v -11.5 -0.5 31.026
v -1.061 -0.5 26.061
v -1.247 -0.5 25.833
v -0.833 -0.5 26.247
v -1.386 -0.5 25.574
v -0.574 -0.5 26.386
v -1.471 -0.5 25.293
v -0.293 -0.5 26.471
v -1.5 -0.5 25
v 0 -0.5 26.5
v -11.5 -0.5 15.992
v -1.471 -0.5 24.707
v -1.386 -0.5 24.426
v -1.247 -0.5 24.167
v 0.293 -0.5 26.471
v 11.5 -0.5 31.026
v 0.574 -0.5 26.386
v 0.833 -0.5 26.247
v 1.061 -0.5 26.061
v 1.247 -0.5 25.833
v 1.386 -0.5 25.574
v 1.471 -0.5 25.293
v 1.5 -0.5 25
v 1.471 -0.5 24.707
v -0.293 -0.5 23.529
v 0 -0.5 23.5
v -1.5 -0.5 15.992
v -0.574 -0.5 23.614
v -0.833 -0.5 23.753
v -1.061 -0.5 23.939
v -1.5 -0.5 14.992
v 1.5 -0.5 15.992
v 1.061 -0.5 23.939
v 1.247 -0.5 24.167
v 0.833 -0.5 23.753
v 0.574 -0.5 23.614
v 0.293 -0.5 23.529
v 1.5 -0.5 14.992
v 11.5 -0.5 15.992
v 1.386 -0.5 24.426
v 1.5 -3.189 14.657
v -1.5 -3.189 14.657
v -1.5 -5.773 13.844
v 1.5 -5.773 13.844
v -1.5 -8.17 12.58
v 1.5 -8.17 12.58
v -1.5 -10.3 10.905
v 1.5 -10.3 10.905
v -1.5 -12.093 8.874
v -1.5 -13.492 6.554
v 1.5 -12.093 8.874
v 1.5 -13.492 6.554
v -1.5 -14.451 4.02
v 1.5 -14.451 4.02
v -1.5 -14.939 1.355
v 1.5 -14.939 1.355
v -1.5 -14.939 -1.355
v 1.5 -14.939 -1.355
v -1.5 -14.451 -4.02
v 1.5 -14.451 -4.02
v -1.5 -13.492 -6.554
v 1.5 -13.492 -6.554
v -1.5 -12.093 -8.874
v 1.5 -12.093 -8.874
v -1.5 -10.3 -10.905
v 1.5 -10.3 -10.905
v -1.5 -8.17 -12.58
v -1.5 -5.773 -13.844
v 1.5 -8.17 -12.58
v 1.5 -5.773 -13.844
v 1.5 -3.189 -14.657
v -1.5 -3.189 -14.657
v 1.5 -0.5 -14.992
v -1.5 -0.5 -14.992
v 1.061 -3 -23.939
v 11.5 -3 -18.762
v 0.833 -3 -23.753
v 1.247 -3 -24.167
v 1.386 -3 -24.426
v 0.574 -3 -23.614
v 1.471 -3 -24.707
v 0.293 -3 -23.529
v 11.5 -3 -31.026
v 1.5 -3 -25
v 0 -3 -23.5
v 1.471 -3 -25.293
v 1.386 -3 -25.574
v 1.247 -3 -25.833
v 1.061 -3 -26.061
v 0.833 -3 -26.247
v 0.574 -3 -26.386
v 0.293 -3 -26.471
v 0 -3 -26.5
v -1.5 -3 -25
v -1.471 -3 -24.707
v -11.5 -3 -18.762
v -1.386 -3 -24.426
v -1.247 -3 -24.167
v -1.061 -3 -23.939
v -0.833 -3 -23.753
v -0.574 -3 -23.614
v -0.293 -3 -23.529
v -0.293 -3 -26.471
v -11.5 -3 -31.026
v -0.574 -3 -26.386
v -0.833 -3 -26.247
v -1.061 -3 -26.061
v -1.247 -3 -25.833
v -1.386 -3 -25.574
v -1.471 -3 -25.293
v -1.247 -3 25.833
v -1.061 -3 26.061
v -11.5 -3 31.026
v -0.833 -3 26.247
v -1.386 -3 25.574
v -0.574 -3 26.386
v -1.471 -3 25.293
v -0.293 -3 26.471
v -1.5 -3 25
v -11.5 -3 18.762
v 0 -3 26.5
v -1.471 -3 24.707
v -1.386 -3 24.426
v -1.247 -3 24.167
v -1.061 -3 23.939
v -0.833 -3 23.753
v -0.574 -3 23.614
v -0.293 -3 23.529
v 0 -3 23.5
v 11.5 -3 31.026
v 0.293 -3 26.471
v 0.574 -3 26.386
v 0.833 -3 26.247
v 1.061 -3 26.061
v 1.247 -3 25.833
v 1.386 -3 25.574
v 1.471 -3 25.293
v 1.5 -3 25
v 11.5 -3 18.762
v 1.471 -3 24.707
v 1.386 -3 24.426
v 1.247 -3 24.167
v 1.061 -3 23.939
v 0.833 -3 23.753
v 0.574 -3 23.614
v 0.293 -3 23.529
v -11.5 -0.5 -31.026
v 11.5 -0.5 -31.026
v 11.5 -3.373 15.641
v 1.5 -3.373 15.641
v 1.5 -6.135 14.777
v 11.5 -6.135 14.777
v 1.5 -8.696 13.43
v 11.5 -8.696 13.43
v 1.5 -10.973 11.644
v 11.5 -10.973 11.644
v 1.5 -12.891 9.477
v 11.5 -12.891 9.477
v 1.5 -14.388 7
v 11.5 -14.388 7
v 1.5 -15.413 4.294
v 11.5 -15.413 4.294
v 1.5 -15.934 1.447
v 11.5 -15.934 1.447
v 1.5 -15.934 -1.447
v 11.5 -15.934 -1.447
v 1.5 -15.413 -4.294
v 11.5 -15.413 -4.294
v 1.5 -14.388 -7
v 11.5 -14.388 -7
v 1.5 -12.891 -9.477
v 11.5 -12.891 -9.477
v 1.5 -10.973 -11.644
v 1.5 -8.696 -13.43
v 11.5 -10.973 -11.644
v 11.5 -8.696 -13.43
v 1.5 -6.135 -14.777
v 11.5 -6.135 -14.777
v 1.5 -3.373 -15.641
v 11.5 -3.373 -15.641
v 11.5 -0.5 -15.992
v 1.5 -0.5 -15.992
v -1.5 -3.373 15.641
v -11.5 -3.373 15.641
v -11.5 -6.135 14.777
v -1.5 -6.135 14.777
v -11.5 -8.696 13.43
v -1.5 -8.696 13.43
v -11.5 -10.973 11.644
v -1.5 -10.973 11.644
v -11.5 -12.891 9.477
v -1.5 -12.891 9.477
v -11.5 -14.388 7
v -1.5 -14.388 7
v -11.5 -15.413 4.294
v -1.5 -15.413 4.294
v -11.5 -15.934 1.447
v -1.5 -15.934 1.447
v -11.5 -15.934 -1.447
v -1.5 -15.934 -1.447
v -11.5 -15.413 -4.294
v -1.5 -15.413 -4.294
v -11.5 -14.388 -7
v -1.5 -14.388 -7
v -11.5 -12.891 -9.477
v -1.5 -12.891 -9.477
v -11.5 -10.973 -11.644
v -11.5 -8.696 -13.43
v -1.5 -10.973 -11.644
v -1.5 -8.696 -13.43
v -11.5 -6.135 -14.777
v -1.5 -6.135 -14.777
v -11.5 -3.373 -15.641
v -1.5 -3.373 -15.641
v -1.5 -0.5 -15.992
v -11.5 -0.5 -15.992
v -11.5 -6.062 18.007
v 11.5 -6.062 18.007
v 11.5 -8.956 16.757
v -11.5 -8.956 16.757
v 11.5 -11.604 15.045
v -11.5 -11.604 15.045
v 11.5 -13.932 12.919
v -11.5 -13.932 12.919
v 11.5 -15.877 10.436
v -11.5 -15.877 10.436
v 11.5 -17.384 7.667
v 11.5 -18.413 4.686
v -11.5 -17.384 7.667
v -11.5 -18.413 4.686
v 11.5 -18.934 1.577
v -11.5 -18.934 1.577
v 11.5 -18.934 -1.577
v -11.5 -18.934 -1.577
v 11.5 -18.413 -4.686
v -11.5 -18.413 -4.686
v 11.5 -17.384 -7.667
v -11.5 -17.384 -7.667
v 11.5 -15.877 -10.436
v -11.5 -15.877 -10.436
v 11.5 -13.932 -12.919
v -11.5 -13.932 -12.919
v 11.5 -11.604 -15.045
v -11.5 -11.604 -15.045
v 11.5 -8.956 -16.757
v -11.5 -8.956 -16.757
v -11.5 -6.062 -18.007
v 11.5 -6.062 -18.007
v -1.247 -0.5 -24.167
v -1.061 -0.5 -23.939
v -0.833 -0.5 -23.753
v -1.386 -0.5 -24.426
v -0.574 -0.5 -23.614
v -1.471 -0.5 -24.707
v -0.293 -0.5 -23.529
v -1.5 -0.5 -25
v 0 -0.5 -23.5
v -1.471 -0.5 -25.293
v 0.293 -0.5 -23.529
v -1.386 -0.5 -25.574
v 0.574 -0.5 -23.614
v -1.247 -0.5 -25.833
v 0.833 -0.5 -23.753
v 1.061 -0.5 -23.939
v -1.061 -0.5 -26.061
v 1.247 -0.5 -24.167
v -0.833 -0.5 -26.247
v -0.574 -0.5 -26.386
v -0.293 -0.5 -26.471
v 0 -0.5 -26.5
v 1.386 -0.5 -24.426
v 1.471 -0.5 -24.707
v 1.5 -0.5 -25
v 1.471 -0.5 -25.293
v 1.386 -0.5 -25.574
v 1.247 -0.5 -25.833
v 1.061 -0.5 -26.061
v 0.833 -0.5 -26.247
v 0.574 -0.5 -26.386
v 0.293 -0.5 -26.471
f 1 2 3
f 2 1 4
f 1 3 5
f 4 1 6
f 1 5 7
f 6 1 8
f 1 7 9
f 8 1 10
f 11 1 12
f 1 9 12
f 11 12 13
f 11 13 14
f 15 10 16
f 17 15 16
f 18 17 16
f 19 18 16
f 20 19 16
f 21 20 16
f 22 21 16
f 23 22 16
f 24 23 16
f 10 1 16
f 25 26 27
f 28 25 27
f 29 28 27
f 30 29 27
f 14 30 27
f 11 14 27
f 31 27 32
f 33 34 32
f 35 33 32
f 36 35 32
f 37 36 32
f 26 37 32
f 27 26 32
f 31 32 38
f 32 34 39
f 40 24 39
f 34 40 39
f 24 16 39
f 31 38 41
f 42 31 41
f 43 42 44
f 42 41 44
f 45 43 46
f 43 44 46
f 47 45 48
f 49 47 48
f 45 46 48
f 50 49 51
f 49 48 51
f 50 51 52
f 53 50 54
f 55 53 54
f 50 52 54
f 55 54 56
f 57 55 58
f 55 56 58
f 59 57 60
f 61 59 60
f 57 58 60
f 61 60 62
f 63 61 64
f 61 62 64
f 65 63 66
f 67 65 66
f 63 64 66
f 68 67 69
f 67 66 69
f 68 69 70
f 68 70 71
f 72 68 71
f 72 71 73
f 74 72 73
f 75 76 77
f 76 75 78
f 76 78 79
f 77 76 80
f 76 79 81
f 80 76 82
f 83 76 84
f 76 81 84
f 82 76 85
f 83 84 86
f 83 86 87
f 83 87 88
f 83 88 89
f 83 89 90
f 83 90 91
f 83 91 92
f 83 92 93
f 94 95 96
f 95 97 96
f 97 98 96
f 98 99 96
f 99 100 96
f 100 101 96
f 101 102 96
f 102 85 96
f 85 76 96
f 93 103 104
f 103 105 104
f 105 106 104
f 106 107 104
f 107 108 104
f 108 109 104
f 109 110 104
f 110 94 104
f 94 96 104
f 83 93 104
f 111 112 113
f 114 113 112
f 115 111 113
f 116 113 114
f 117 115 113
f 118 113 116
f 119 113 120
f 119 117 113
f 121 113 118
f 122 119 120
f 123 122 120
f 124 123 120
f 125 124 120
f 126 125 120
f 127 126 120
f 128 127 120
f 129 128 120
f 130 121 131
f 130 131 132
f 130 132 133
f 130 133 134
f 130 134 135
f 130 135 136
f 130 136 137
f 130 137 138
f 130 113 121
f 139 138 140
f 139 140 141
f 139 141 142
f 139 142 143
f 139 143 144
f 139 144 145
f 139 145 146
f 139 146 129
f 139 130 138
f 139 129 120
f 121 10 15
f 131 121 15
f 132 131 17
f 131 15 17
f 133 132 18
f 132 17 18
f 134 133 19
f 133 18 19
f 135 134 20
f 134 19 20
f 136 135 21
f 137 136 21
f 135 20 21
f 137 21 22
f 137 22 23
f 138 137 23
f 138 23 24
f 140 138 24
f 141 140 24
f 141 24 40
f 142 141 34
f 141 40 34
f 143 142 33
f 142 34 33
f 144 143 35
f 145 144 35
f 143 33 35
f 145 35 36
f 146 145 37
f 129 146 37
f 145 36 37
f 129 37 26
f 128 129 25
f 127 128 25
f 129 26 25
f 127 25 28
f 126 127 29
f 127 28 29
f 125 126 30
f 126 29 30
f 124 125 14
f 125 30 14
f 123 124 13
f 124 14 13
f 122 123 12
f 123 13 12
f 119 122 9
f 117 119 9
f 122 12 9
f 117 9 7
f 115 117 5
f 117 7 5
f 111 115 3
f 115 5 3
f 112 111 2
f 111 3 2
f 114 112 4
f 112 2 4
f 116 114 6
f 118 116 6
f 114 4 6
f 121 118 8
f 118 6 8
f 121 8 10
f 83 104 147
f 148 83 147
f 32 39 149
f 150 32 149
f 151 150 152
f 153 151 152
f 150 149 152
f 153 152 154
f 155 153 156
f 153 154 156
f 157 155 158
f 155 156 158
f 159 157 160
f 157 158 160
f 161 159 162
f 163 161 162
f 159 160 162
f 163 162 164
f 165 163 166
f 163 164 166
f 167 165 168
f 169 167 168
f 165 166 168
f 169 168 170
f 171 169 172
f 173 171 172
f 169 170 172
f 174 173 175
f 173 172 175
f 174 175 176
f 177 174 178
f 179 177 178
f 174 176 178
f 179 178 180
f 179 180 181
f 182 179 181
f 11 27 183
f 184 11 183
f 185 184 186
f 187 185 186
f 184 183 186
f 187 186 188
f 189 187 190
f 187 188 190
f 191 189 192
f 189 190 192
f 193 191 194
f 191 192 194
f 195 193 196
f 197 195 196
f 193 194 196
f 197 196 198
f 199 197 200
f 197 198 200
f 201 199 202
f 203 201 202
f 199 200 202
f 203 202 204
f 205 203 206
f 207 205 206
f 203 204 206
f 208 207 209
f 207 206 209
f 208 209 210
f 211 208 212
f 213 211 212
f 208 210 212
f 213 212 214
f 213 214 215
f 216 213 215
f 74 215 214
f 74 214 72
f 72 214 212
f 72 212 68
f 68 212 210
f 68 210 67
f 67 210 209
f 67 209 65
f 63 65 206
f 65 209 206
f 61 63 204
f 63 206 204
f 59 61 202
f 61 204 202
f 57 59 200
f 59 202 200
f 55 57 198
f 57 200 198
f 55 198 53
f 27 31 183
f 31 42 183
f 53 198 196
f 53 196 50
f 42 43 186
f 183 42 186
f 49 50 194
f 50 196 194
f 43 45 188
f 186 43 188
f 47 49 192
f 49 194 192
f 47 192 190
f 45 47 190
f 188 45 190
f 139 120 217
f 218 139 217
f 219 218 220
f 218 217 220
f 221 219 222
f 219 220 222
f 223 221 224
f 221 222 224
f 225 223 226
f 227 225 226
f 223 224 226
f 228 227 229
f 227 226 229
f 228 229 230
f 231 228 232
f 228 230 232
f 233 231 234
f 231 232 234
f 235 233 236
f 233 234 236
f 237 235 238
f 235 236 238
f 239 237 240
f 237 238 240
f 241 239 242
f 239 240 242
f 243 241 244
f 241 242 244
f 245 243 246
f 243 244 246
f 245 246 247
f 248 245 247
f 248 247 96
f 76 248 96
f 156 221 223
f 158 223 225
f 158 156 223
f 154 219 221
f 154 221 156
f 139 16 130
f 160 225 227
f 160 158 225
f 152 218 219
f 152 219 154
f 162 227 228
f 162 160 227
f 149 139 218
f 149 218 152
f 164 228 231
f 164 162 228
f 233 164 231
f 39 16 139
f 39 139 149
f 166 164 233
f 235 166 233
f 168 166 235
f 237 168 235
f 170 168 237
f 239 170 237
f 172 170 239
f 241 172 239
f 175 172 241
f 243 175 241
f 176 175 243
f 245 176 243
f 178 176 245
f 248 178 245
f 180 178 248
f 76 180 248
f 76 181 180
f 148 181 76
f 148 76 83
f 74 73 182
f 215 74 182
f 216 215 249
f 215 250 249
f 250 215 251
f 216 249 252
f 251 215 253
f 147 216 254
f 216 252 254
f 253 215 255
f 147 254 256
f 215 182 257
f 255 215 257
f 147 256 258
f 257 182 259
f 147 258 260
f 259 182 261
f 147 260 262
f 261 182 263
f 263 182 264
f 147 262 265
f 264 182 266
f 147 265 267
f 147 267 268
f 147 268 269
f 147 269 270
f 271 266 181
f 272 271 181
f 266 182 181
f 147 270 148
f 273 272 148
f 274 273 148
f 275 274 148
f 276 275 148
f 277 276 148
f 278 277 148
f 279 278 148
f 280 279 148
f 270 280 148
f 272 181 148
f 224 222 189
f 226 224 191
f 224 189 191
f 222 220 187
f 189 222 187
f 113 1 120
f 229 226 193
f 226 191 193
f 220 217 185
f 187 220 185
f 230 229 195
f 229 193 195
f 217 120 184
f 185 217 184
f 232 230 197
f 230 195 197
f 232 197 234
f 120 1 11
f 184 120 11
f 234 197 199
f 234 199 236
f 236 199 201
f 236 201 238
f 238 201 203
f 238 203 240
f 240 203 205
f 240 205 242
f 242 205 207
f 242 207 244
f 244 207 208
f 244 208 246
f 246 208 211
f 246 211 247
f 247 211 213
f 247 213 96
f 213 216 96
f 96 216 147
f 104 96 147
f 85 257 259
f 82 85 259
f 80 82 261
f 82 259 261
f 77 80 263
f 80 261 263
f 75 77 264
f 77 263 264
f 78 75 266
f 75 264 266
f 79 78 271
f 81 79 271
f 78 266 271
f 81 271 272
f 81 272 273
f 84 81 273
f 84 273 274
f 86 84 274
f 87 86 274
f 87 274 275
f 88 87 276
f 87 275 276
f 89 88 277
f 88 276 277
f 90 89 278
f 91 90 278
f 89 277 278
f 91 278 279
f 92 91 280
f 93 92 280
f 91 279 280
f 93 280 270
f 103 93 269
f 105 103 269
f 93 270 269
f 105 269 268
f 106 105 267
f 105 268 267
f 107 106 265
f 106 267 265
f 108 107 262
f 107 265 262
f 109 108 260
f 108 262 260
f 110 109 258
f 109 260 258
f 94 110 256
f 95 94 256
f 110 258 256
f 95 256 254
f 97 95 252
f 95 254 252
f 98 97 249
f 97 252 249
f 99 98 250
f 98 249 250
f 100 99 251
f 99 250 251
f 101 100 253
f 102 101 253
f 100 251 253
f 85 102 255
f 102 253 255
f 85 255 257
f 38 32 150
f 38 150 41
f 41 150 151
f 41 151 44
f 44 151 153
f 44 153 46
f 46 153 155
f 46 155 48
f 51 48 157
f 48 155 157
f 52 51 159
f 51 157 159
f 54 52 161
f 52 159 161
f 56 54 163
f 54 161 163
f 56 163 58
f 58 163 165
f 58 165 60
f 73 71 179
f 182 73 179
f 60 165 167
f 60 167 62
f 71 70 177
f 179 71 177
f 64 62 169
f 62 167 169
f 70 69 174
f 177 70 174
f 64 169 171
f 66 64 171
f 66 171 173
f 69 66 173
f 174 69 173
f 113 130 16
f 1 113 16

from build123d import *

# Parameters (mm, degrees)
SKETCH3_W           = 13.566130208
SKETCH3_H           = 6
BOSS_EXTRUDE1_DEPTH = 11.5
SKETCH4_R           = 1.5
CUT_EXTRUDE1_DEPTH  = 11.5
SKETCH5_W           = 75.75040558
SKETCH5_H           = 1
CUT_EXTRUDE2_DEPTH  = 26


with BuildPart() as part:
    # Sketch2 → Revolve1 (revolve)
    with BuildSketch(Plane(origin=(0, 0, 0), x_dir=(1, 0, 0), z_dir=(0, 1, 0)), mode=Mode.PRIVATE) as revolve1_sk:
        Polygon((-11.5, 16), (-1.5, 16), (-1.5, 15), (1.5, 15), (1.5, 16), (11.5, 16), (11.5, 19), (-11.5, 19), align=None)
    revolve(revolve1_sk.sketch.rotate(Axis((-71.722155375, 0, 0), (1, 0, 0)), 180), axis=Axis((-71.722155375, 0, 0), (1, 0, 0)))

    # Sketch3 → Boss-Extrude1 (add, symmetric)
    with BuildSketch(Plane(origin=(0, 0, 0), x_dir=(0, 0, -1), z_dir=(1, 0, 0))):
        with Locations((24.243185686, 0)):
            Rectangle(SKETCH3_W, SKETCH3_H)
        with Locations((-24.243185686, 0)):
            Rectangle(SKETCH3_W, SKETCH3_H)
    extrude(amount=BOSS_EXTRUDE1_DEPTH, both=True)

    # Sketch4 → Cut-Extrude1 (cut, symmetric)
    with BuildSketch(Plane(origin=(0, 0, 0), x_dir=(1, 0, 0), z_dir=(0, 1, 0))):
        with Locations(Location((0, 25, 0), (0, 0, 270))):
            Circle(SKETCH4_R)
        with Locations(Location((0, -25, 0), (0, 0, 270))):
            Circle(SKETCH4_R)
    extrude(amount=CUT_EXTRUDE1_DEPTH, both=True, mode=Mode.SUBTRACT)

    # Sketch5 → Cut-Extrude2 (cut, symmetric)
    with BuildSketch(Plane(origin=(0, 0, 0), x_dir=(0, 0, -1), z_dir=(1, 0, 0))):
        Rectangle(SKETCH5_W, SKETCH5_H)
    extrude(amount=CUT_EXTRUDE2_DEPTH, both=True, mode=Mode.SUBTRACT)


with BuildPart() as cut_extrude2_piece_1:
    # of the separate pieces the step leaves, piece 1, a body of its own (cut_extrude2_pieces)
    add(part.part.solids().sort_by_distance((-11.5, 0.5, -15.992185592))[0])


with BuildPart() as cut_extrude2_piece_2:
    # of the separate pieces the step leaves, piece 2, a body of its own (cut_extrude2_pieces)
    add(part.part.solids().sort_by_distance((-11.5, -0.5, 15.992185592))[0])


solid = cut_extrude2_piece_2.part
